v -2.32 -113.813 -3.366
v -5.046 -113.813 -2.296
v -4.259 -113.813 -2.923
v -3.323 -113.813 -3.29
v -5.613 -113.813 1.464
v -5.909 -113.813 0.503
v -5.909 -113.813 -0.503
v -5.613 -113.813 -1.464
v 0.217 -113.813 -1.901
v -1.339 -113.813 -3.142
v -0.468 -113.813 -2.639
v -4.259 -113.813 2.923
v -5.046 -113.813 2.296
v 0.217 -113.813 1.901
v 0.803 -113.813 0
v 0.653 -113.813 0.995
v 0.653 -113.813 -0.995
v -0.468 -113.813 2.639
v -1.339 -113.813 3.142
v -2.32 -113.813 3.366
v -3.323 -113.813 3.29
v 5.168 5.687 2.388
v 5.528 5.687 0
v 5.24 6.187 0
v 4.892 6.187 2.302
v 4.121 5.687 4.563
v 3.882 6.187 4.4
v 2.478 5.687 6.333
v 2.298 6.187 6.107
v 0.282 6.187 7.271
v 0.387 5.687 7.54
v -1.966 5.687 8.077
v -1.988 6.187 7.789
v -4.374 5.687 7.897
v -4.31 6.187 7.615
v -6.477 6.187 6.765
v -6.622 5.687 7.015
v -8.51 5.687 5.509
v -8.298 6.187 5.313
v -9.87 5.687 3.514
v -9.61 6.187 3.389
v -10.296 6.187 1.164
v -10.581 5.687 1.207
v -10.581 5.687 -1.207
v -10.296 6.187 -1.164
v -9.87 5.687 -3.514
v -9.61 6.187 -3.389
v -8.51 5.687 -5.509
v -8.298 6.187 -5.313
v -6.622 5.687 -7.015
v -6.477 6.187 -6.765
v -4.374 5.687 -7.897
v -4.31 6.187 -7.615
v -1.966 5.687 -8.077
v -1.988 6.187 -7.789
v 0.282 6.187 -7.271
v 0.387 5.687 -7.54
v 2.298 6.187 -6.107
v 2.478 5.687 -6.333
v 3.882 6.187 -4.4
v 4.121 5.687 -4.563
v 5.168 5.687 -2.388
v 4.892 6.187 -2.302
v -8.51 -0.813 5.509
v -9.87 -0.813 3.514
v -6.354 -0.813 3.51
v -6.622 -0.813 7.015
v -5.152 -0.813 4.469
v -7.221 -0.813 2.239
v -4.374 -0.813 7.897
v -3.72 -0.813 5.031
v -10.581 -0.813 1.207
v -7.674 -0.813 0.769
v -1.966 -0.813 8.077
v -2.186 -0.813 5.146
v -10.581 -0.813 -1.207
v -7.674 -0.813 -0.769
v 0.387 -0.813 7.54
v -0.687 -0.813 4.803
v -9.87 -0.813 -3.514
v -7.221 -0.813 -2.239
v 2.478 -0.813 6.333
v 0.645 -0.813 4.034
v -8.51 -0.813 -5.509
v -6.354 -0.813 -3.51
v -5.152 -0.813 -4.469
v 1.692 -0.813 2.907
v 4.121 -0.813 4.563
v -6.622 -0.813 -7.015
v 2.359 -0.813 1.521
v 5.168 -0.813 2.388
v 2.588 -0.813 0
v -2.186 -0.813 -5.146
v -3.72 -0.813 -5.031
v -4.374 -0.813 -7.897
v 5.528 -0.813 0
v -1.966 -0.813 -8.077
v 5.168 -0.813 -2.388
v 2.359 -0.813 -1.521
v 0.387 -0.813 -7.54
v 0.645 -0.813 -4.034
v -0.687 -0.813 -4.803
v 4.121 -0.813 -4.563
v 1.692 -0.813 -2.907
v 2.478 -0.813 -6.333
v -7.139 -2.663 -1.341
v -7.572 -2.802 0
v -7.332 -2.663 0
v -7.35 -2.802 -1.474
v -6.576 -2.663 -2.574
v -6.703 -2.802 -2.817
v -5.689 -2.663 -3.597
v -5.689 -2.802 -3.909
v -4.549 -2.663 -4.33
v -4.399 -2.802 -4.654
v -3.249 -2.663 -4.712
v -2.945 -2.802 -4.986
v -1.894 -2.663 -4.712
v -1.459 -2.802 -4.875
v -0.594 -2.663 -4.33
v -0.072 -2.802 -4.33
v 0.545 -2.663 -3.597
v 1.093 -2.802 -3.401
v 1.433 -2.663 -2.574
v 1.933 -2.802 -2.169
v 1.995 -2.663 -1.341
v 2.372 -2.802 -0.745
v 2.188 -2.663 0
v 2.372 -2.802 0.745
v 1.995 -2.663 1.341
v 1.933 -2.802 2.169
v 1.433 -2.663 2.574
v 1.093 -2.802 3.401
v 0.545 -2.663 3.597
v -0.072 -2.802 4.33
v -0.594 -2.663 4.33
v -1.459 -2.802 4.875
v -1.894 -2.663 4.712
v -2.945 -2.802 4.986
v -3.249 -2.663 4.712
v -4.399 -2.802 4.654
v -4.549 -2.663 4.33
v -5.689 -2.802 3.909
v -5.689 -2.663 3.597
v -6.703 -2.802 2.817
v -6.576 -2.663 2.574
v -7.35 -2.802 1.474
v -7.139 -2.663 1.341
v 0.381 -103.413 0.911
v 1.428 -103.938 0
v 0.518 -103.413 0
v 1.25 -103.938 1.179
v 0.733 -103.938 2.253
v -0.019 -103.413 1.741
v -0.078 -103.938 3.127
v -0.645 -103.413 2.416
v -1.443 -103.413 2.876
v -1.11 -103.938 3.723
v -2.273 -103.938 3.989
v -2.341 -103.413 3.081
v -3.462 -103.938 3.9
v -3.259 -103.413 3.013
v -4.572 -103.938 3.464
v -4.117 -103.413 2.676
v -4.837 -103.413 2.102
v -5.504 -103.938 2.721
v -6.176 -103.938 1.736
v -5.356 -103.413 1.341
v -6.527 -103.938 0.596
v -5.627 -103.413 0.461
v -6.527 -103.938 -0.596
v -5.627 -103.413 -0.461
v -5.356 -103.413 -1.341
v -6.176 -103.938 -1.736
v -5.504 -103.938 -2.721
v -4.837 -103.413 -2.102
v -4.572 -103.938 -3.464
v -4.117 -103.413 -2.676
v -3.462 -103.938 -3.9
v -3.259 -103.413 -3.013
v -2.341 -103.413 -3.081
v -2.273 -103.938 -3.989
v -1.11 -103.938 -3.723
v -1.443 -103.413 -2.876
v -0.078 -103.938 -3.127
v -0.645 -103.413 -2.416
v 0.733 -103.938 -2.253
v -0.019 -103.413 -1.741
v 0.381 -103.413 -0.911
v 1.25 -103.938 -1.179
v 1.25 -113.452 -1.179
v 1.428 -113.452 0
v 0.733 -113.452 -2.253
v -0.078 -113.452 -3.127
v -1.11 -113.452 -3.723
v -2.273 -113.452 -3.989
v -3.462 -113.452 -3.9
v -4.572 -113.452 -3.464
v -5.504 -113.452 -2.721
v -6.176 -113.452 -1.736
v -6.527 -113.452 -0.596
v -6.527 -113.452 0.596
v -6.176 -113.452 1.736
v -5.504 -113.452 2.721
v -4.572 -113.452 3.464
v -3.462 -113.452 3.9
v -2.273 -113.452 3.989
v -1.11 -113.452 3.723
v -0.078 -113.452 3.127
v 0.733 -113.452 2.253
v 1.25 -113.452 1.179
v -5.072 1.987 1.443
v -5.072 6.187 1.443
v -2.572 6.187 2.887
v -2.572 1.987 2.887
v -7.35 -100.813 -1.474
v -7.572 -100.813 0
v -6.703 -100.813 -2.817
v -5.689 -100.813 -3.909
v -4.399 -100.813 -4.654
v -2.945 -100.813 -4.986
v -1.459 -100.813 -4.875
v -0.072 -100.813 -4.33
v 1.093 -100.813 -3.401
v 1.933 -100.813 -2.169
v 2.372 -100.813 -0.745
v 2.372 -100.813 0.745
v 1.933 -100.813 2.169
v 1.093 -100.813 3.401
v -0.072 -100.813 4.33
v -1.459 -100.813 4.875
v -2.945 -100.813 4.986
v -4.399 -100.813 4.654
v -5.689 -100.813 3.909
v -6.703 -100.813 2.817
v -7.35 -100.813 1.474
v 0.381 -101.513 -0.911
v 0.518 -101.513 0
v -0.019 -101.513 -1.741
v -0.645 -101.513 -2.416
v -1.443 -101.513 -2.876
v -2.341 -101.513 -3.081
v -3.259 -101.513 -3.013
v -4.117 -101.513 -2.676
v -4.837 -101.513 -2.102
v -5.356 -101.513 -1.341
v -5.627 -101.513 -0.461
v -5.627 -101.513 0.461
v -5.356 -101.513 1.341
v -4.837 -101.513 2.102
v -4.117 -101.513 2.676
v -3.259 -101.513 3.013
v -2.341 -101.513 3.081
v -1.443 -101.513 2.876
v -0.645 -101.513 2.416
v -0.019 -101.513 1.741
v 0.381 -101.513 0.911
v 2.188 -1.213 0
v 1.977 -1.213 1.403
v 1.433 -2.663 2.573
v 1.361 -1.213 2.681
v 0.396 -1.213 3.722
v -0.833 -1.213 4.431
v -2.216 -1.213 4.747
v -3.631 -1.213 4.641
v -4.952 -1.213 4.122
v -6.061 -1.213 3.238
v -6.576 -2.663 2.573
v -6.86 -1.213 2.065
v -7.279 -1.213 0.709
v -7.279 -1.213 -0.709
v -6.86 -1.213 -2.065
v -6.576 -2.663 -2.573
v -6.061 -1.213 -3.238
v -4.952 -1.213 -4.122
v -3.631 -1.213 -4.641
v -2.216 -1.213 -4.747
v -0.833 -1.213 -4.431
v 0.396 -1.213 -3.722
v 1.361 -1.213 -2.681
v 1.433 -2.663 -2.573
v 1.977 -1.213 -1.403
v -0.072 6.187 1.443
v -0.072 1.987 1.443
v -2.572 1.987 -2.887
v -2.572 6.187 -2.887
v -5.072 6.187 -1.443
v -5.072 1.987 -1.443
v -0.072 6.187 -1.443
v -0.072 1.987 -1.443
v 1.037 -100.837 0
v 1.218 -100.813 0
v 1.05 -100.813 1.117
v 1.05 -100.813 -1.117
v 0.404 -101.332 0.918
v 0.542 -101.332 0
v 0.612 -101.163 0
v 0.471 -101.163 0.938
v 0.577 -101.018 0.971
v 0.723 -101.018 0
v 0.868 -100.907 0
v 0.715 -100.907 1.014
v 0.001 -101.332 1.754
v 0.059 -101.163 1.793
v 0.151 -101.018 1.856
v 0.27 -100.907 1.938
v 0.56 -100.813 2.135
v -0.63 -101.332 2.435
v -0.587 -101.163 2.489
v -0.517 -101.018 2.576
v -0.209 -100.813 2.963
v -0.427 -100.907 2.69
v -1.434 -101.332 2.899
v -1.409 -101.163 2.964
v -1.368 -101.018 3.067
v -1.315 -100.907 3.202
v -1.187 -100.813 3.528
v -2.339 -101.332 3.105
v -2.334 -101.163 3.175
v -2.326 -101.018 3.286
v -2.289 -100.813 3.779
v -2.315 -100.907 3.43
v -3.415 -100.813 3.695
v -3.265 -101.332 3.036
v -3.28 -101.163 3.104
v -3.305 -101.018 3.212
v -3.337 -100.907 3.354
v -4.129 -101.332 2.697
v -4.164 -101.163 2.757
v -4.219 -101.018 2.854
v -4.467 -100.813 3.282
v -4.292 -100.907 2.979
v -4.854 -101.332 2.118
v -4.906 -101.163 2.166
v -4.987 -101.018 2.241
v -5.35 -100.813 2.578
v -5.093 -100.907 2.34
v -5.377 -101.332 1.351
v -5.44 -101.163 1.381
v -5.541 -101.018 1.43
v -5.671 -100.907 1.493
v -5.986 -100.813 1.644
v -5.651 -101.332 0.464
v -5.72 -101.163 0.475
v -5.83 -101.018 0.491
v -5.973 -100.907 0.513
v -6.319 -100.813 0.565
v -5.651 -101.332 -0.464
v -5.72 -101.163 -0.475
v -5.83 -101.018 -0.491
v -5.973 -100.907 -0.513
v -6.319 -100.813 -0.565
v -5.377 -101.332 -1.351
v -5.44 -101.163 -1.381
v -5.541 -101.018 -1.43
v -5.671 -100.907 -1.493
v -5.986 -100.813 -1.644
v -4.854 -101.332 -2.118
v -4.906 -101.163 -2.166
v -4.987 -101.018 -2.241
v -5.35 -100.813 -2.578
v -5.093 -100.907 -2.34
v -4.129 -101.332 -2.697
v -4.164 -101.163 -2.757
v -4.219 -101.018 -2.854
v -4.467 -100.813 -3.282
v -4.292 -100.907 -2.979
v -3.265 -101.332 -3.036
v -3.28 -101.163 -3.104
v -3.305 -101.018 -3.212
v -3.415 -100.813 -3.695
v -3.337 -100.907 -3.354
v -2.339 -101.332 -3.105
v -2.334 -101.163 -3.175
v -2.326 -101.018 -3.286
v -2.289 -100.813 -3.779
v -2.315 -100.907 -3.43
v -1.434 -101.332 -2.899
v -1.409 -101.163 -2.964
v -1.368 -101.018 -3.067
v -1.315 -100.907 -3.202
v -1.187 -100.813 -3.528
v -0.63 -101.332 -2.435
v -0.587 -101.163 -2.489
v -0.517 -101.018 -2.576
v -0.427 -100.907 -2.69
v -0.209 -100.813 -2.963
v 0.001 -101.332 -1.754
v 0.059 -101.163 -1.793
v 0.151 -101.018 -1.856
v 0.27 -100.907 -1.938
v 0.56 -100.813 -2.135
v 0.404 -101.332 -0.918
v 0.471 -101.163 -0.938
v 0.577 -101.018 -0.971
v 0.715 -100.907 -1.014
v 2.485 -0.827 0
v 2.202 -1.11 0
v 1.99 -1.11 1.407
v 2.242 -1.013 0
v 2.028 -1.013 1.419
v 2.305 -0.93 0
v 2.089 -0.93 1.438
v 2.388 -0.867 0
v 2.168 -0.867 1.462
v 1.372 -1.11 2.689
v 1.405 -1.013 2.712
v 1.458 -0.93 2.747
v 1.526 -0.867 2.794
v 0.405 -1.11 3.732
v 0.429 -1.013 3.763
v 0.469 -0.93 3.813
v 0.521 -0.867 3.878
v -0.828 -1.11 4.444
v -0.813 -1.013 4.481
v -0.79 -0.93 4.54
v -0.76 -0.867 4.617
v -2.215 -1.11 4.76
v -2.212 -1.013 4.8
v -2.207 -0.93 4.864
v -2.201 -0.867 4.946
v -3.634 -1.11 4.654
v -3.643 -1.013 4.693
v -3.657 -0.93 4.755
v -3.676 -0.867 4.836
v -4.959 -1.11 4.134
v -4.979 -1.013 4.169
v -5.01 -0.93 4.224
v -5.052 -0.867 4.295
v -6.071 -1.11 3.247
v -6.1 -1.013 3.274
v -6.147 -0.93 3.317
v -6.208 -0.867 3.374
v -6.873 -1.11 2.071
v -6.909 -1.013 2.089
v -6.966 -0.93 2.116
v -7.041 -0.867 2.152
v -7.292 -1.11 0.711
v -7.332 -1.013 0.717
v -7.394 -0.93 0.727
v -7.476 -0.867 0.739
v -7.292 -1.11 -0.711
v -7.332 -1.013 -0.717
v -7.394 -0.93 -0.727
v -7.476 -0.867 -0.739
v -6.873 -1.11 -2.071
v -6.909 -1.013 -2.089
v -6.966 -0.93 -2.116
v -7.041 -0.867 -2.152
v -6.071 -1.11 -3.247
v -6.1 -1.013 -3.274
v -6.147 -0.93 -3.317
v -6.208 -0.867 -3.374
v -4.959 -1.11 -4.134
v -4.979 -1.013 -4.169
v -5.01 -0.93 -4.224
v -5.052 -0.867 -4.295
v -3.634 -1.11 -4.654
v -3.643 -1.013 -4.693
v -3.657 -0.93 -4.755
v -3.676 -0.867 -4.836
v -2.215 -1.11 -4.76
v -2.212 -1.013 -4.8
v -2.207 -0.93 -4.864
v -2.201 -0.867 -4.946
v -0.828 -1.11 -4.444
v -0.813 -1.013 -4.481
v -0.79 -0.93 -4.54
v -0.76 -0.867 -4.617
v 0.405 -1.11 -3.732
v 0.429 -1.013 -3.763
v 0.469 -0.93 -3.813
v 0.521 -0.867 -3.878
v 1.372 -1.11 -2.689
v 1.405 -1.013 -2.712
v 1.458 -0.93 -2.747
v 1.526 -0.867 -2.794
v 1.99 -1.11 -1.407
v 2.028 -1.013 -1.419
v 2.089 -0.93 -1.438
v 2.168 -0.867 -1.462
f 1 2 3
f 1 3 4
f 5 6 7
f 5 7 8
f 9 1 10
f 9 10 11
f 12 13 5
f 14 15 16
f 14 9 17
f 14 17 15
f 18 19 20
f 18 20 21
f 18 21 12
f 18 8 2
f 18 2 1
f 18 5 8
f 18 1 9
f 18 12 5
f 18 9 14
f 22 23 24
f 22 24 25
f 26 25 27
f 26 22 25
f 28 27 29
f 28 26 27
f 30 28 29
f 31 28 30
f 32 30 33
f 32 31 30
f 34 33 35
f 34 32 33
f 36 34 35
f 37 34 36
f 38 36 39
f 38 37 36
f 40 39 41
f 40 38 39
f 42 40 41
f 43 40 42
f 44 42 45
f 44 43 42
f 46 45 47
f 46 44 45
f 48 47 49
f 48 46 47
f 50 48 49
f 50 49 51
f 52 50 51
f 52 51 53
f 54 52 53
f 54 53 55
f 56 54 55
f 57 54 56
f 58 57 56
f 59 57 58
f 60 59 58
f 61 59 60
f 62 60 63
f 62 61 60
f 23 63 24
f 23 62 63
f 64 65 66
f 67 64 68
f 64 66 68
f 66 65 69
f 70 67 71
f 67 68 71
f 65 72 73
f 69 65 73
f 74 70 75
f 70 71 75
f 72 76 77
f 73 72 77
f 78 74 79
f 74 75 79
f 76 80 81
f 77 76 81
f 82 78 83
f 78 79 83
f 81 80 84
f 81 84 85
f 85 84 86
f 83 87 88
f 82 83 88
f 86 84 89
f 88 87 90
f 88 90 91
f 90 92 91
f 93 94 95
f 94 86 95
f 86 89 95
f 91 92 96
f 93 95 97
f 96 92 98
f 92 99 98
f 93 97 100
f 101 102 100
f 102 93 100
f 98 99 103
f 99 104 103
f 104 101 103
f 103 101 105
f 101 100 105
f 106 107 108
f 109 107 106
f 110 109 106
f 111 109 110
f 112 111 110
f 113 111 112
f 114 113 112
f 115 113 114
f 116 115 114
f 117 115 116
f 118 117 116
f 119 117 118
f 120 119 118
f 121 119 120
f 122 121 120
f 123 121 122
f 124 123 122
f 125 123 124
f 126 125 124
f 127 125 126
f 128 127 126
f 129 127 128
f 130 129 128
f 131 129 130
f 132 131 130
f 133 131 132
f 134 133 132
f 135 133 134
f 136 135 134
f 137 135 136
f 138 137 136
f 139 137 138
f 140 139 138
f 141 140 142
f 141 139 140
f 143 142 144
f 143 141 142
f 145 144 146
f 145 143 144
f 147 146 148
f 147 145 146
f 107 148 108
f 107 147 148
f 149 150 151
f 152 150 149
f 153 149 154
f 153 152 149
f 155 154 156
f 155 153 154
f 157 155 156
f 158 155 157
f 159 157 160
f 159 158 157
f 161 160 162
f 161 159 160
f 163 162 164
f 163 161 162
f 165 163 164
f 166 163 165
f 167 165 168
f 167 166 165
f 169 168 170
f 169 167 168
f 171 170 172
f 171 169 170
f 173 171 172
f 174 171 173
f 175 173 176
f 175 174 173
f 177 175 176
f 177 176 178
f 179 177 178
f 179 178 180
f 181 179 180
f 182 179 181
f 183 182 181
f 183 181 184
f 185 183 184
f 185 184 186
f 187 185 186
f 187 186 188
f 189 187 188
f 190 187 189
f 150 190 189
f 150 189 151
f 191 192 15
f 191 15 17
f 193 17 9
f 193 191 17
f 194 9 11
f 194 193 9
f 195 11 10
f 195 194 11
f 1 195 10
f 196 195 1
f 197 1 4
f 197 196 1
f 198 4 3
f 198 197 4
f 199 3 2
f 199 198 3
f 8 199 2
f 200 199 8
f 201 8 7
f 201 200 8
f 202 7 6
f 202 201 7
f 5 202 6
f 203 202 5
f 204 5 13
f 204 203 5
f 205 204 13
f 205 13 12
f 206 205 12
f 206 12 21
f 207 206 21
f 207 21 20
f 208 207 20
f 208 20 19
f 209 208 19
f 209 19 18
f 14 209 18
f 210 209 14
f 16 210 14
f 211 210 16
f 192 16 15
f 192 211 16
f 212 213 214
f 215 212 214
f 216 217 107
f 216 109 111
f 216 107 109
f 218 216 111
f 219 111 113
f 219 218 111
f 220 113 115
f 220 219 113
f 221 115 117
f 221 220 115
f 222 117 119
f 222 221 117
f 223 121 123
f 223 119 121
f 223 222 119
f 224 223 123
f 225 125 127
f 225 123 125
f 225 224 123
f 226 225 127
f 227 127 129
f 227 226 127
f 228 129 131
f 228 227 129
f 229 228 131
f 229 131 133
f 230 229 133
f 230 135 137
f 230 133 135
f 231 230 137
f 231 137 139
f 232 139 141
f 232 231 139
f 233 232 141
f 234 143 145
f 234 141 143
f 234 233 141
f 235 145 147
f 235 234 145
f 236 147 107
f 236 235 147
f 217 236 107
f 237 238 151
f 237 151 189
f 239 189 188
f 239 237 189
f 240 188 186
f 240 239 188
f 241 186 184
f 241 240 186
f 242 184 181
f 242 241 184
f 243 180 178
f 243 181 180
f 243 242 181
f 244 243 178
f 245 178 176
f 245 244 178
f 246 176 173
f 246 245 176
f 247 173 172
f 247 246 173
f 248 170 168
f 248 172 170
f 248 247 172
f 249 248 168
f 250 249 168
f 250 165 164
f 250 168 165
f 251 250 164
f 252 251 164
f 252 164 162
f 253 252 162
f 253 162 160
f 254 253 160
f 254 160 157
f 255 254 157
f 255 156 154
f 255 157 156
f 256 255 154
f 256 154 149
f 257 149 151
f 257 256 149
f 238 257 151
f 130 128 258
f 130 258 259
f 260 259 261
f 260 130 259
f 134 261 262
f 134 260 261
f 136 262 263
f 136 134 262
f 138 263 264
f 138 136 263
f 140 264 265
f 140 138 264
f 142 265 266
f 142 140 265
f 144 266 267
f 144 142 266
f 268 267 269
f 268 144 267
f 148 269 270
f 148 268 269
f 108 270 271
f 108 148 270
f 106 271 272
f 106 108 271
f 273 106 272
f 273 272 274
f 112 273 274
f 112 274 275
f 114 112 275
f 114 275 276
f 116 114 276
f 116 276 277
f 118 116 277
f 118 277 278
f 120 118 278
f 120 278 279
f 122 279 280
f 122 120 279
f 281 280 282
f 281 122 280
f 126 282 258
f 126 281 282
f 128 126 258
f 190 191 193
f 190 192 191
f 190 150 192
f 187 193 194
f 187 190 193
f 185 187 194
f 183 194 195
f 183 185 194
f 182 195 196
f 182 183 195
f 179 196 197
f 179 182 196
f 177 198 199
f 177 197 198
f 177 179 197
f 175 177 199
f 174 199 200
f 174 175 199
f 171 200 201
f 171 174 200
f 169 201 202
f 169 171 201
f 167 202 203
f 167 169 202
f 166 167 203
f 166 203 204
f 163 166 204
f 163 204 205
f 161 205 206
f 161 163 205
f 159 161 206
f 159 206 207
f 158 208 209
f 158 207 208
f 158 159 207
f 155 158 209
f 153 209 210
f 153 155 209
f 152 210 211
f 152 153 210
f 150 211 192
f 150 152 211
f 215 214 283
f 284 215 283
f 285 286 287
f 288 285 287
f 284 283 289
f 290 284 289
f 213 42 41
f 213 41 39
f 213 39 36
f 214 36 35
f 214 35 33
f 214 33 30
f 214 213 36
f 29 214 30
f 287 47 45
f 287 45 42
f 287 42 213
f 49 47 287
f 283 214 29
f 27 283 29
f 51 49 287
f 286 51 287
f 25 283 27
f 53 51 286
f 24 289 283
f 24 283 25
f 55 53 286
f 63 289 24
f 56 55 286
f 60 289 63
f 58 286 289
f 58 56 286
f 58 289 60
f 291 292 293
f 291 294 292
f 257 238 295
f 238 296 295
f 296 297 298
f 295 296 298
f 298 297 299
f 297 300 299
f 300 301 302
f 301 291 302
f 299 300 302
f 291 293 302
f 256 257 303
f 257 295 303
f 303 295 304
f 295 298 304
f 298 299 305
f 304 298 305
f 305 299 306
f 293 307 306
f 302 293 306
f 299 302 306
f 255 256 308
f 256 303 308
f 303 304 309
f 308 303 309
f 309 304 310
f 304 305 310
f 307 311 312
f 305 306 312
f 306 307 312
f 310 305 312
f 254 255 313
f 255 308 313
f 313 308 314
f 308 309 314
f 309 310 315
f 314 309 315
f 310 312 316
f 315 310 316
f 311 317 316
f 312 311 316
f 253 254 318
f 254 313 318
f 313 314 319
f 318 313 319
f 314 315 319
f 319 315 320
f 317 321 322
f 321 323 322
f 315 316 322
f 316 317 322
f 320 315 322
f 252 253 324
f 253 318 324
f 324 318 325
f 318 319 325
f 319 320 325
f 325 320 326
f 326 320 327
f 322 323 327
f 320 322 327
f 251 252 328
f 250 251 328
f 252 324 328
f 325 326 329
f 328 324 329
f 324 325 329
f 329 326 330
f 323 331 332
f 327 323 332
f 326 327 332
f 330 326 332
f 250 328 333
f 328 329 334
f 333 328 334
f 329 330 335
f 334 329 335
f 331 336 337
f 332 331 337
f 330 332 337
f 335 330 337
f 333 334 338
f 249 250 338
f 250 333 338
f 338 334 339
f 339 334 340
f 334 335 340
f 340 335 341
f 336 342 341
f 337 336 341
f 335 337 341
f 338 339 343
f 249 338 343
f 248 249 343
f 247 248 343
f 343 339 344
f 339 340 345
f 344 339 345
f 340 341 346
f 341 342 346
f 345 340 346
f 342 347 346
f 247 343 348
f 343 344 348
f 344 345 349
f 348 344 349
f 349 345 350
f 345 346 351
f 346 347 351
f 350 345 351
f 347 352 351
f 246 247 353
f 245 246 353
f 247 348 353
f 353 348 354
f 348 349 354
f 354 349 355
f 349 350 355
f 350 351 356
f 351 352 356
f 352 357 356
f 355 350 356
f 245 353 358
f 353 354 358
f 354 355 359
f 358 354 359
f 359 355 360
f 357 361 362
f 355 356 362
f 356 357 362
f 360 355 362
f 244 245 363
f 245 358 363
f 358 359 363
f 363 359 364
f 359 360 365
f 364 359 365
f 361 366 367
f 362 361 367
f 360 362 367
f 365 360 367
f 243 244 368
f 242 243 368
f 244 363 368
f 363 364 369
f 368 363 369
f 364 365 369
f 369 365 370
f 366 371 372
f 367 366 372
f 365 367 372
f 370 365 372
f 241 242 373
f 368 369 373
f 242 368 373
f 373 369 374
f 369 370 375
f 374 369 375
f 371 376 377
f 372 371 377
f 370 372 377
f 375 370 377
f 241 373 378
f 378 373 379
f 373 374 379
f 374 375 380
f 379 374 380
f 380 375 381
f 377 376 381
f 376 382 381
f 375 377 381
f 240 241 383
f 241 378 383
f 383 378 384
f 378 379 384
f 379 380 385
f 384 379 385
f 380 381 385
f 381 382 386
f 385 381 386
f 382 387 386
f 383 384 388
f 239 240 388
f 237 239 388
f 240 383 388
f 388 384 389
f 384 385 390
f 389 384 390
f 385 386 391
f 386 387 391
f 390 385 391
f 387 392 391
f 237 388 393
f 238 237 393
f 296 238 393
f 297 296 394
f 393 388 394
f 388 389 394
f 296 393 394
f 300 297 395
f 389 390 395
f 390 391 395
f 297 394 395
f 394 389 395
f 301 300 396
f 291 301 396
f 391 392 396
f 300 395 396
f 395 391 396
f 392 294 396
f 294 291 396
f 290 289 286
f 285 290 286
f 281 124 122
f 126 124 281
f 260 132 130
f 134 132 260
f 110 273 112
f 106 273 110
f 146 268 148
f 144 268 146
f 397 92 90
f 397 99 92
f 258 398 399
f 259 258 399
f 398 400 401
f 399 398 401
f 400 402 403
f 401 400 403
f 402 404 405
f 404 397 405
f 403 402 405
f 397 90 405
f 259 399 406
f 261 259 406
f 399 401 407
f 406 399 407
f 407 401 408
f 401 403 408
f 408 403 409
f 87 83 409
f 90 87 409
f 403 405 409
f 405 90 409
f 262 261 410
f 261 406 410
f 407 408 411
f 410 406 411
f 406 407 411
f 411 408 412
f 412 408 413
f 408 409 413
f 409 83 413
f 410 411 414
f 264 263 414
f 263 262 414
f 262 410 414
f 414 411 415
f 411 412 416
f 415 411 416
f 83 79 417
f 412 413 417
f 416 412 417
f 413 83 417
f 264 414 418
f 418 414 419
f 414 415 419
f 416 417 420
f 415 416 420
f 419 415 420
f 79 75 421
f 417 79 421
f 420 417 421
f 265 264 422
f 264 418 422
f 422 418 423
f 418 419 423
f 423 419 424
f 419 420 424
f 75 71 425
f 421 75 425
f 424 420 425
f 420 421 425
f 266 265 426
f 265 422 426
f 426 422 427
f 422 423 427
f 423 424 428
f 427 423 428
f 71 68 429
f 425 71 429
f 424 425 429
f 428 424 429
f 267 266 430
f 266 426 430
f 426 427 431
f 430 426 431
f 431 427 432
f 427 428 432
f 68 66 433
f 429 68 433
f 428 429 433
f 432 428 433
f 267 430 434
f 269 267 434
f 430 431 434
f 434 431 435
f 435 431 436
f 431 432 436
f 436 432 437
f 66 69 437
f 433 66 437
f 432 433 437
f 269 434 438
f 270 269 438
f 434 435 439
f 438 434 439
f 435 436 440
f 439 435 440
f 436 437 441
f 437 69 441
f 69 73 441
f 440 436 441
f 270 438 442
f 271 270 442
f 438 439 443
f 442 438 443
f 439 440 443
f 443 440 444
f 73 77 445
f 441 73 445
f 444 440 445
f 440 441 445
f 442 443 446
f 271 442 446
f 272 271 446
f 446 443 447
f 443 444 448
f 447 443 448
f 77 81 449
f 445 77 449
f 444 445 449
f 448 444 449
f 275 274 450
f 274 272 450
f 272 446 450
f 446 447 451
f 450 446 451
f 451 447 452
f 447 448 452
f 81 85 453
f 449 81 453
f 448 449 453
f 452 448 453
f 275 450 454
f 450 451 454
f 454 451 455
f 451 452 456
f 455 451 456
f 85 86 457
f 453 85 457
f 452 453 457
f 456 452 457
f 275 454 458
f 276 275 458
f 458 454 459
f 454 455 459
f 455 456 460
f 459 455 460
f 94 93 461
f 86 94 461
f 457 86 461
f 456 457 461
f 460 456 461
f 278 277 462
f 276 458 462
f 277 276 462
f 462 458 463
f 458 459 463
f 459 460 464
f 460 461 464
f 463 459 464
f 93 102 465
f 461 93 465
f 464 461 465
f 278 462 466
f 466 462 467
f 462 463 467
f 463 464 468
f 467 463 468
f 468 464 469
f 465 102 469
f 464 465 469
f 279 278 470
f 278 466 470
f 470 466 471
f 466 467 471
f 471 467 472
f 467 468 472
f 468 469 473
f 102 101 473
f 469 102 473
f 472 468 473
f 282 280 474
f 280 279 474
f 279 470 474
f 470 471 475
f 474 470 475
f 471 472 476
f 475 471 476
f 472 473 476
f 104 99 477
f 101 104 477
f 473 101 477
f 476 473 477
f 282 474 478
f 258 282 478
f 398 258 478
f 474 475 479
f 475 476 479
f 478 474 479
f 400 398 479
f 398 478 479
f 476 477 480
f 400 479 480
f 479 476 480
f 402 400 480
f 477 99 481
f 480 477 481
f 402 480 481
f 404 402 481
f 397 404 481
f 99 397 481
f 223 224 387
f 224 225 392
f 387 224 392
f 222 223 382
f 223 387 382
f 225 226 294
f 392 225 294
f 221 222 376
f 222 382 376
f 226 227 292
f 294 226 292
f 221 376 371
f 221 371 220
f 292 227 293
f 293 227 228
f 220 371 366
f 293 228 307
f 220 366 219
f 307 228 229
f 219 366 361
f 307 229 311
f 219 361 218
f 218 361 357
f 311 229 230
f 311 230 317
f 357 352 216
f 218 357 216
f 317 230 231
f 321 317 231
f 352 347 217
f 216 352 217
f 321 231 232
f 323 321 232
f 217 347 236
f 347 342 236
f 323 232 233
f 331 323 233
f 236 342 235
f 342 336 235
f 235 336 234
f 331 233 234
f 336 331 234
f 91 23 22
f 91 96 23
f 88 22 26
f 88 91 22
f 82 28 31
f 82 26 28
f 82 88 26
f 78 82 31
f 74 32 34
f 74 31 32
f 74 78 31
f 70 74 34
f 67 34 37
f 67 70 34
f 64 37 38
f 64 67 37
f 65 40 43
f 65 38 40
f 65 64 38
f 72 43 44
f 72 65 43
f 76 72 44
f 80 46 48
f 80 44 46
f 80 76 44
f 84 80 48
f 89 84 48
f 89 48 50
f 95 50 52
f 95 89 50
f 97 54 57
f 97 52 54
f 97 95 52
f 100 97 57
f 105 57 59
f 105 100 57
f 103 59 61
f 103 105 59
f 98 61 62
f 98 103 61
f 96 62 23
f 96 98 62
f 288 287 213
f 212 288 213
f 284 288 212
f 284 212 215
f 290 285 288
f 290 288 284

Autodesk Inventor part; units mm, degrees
ref_plane "YZ Plane" through (0, 0, 0) normal (1, 0, 0) x (0, 1, 0)
ref_plane "XZ Plane" through (0, 0, 0) normal (0, 1, 0) x (-1, 0, 0)
ref_plane "XY Plane" through (0, 0, 0) normal (0, 0, 1) x (1, 0, 0)
sketch "Sketch1" plane through (0, 0, 0) normal (0, 0, 1) x (1, 0, 0)
  line L0 (-2.5718, -2.6632) -> (-7.5718, -2.6632)
  line L1 (-7.5718, -2.6632) -> (-7.5718, -100.8132)
  line L2 (-7.5718, -100.8132) -> (-2.5718, -100.8132)
  line L3 (-2.5718, -100.8132) -> (-2.5718, -2.6632)
  dimension "d1" = 98.15
  dimension "d2" = 5
revolve "Shoulder" add sketch "Sketch1" angle 360 about axis through (-2.5718, -100.8132, 0) along (0, 1, 0)
sketch "Sketch2" plane through (-2.5718, -2.6632, 0) normal (0, 1, 0) x (1, 0, 0)
  circle A0 centre (0, 0) radius 5 projected
  circle A1 centre (0, 0) radius 4.76
  dimension "d3" = 9.52
extrude "Shoulder_neck" add sketch "Sketch2" along normal blind 1.85 contours A1
sketch "Sketch3" plane through (-2.5718, -0.8132, 0) normal (0, 1, 0) x (1, 0, 0)
  circle A0 centre (0, 0) radius 4.76 projected
  circle A1 centre (0, 0) radius 8.1
  dimension "d6" = 16.2
extrude "Head" add sketch "Sketch3" along normal blind 7 contours A0 | A1
sketch "Sketch4" plane through (-2.5718, -100.8132, 0) normal (0, -1, 0) x (1, 0, 0)
  circle A0 centre (0, 0) radius 5 projected
  circle A1 centre (0, 0) radius 3.09
  dimension "d9" = 6.18
extrude "Thread_neck" add sketch "Sketch4" along normal blind 2.6 contours A1
sketch "Sketch5" plane through (-2.5718, -103.4132, 0) normal (0, -1, 0) x (1, 0, 0)
  circle A0 centre (0, 0) radius 3.09 projected
  circle A1 centre (0, 0) radius 4
  dimension "d12" = 8
extrude "Thread_shoulder" add sketch "Sketch5" along normal blind 10.4 contours A0 | A1
sketch "Sketch6" plane through (-2.5718, 6.1868, 0) normal (0, 1, 0) x (1, 0, 0)
  circle A0 centre (0, 0) radius 8.1 projected
  circle A1 centre (0, 0) radius 2.5 construction
  line L0 (-2.5, 1.4434) -> (-2.5, -1.4434)
  line L1 (-2.5, -1.4434) -> (0, -2.8868)
  line L2 (0, -2.8868) -> (2.5, -1.4434)
  line L3 (2.5, -1.4434) -> (2.5, 1.4434)
  line L4 (2.5, 1.4434) -> (0, 2.8868)
  line L5 (0, 2.8868) -> (-2.5, 1.4434)
  dimension "d15" = 5
extrude "Hex" cut sketch "Sketch6" against normal blind 4.2 contours L5 L4 L3 L2 L1 L0
chamfer "Chamfer1" distance 0.24 angle 30 1 edges at (2.4282, -2.6632, 0) measured on face at (-7.3973, -2.6632, -0.7786)
fillet "Fillet1" radius 0.4 1 edges at (-7.3318, -0.8132, 0)
chamfer "Chamfer2" distance 0.5 angle 30 1 edges at (-10.6718, 6.1868, 0) measured on face at (5.4233, 3.8535, 1.2993)
chamfer "Chamfer3" distance 0.625 angle 30 1 edges at (-6.5718, -113.8132, 0) measured on face at (-1.8144, -113.8132, 1.0973)
fillet "Fillet2" radius 0.7 1 edges at (-5.6618, -100.8132, 0)
chamfer "Chamfer7" distance 0.91 angle 30 1 edges at (-6.5718, -103.4132, 0) measured on face at (1.0861, -103.4132, -0.3191)
thread "Thread" size "M8x1.25" class "6g" standard "ANSI Metric M Profile" full length
equation "\"d1\" = Shoulder_length - Shoulder_neck_length"
equation "\"d2\" = 0.5 * Shoulder_diameter"
equation "\"d3\" = Shoulder_neck_dia"
equation "\"d4\" = Shoulder_neck_length"
equation "\"d6\" = Head_diameter"
equation "\"d7\" = Head_height"
equation "\"d9\" = Thread_neck_dia"
equation "\"d10\" = Thread_neck_length"
equation "\"d12\" = Thread_diameter"
equation "\"d13\" = Thread_length - Thread_neck_length"
equation "\"d15\" = Hex_size"
equation "\"d16\" = Hex_length"
equation "\"d18\" = -0.5 * Shoulder_neck_dia + 0.5 * Shoulder_diameter"
equation "\"d64\" = -0.5 * Shoulder_neck_dia + 0.5 * Shoulder_diameter"
equation "\"d21\" = 0.1 * Hex_size"
equation "\"d65\" = 0.1 * Hex_size"
equation "\"d23\" = 0.5 * Thread_pitch"
equation "\"d66\" = 0.5 * Thread_pitch"
equation "\"d25\" = Thread_neck_radius"
equation "\"d60\" = -0.5 * Thread_neck_dia + 0.5 * Thread_diameter"
equation "\"d67\" = -0.5 * Thread_neck_dia + 0.5 * Thread_diameter"
equation "\"Shoulder_length\" = 100"
equation "\"Shoulder_neck_dia\" = 9.52"
equation "\"Thread_diameter\" = 8"
equation "\"Thread_length\" = 13"
equation "\"Head_diameter\" = 16.2"
equation "\"Head_height\" = 7"
equation "\"Thread_neck_dia\" = 6.18"
equation "\"Hex_size\" = 5"
equation "\"Hex_length\" = 4.2"
equation "\"Thread_pitch\" = 1.25"
equation "\"Shoulder_neck_length\" = 1.85"
equation "\"Thread_neck_length\" = 2.6"
equation "\"Thread_neck_radius\" = 0.7"
equation "\"Shoulder_diameter\" = 10"
properties part number "SCREW, SHOULDER, P, 12.9,  M10X100MM" material "Steel, High Strength Low Alloy"
